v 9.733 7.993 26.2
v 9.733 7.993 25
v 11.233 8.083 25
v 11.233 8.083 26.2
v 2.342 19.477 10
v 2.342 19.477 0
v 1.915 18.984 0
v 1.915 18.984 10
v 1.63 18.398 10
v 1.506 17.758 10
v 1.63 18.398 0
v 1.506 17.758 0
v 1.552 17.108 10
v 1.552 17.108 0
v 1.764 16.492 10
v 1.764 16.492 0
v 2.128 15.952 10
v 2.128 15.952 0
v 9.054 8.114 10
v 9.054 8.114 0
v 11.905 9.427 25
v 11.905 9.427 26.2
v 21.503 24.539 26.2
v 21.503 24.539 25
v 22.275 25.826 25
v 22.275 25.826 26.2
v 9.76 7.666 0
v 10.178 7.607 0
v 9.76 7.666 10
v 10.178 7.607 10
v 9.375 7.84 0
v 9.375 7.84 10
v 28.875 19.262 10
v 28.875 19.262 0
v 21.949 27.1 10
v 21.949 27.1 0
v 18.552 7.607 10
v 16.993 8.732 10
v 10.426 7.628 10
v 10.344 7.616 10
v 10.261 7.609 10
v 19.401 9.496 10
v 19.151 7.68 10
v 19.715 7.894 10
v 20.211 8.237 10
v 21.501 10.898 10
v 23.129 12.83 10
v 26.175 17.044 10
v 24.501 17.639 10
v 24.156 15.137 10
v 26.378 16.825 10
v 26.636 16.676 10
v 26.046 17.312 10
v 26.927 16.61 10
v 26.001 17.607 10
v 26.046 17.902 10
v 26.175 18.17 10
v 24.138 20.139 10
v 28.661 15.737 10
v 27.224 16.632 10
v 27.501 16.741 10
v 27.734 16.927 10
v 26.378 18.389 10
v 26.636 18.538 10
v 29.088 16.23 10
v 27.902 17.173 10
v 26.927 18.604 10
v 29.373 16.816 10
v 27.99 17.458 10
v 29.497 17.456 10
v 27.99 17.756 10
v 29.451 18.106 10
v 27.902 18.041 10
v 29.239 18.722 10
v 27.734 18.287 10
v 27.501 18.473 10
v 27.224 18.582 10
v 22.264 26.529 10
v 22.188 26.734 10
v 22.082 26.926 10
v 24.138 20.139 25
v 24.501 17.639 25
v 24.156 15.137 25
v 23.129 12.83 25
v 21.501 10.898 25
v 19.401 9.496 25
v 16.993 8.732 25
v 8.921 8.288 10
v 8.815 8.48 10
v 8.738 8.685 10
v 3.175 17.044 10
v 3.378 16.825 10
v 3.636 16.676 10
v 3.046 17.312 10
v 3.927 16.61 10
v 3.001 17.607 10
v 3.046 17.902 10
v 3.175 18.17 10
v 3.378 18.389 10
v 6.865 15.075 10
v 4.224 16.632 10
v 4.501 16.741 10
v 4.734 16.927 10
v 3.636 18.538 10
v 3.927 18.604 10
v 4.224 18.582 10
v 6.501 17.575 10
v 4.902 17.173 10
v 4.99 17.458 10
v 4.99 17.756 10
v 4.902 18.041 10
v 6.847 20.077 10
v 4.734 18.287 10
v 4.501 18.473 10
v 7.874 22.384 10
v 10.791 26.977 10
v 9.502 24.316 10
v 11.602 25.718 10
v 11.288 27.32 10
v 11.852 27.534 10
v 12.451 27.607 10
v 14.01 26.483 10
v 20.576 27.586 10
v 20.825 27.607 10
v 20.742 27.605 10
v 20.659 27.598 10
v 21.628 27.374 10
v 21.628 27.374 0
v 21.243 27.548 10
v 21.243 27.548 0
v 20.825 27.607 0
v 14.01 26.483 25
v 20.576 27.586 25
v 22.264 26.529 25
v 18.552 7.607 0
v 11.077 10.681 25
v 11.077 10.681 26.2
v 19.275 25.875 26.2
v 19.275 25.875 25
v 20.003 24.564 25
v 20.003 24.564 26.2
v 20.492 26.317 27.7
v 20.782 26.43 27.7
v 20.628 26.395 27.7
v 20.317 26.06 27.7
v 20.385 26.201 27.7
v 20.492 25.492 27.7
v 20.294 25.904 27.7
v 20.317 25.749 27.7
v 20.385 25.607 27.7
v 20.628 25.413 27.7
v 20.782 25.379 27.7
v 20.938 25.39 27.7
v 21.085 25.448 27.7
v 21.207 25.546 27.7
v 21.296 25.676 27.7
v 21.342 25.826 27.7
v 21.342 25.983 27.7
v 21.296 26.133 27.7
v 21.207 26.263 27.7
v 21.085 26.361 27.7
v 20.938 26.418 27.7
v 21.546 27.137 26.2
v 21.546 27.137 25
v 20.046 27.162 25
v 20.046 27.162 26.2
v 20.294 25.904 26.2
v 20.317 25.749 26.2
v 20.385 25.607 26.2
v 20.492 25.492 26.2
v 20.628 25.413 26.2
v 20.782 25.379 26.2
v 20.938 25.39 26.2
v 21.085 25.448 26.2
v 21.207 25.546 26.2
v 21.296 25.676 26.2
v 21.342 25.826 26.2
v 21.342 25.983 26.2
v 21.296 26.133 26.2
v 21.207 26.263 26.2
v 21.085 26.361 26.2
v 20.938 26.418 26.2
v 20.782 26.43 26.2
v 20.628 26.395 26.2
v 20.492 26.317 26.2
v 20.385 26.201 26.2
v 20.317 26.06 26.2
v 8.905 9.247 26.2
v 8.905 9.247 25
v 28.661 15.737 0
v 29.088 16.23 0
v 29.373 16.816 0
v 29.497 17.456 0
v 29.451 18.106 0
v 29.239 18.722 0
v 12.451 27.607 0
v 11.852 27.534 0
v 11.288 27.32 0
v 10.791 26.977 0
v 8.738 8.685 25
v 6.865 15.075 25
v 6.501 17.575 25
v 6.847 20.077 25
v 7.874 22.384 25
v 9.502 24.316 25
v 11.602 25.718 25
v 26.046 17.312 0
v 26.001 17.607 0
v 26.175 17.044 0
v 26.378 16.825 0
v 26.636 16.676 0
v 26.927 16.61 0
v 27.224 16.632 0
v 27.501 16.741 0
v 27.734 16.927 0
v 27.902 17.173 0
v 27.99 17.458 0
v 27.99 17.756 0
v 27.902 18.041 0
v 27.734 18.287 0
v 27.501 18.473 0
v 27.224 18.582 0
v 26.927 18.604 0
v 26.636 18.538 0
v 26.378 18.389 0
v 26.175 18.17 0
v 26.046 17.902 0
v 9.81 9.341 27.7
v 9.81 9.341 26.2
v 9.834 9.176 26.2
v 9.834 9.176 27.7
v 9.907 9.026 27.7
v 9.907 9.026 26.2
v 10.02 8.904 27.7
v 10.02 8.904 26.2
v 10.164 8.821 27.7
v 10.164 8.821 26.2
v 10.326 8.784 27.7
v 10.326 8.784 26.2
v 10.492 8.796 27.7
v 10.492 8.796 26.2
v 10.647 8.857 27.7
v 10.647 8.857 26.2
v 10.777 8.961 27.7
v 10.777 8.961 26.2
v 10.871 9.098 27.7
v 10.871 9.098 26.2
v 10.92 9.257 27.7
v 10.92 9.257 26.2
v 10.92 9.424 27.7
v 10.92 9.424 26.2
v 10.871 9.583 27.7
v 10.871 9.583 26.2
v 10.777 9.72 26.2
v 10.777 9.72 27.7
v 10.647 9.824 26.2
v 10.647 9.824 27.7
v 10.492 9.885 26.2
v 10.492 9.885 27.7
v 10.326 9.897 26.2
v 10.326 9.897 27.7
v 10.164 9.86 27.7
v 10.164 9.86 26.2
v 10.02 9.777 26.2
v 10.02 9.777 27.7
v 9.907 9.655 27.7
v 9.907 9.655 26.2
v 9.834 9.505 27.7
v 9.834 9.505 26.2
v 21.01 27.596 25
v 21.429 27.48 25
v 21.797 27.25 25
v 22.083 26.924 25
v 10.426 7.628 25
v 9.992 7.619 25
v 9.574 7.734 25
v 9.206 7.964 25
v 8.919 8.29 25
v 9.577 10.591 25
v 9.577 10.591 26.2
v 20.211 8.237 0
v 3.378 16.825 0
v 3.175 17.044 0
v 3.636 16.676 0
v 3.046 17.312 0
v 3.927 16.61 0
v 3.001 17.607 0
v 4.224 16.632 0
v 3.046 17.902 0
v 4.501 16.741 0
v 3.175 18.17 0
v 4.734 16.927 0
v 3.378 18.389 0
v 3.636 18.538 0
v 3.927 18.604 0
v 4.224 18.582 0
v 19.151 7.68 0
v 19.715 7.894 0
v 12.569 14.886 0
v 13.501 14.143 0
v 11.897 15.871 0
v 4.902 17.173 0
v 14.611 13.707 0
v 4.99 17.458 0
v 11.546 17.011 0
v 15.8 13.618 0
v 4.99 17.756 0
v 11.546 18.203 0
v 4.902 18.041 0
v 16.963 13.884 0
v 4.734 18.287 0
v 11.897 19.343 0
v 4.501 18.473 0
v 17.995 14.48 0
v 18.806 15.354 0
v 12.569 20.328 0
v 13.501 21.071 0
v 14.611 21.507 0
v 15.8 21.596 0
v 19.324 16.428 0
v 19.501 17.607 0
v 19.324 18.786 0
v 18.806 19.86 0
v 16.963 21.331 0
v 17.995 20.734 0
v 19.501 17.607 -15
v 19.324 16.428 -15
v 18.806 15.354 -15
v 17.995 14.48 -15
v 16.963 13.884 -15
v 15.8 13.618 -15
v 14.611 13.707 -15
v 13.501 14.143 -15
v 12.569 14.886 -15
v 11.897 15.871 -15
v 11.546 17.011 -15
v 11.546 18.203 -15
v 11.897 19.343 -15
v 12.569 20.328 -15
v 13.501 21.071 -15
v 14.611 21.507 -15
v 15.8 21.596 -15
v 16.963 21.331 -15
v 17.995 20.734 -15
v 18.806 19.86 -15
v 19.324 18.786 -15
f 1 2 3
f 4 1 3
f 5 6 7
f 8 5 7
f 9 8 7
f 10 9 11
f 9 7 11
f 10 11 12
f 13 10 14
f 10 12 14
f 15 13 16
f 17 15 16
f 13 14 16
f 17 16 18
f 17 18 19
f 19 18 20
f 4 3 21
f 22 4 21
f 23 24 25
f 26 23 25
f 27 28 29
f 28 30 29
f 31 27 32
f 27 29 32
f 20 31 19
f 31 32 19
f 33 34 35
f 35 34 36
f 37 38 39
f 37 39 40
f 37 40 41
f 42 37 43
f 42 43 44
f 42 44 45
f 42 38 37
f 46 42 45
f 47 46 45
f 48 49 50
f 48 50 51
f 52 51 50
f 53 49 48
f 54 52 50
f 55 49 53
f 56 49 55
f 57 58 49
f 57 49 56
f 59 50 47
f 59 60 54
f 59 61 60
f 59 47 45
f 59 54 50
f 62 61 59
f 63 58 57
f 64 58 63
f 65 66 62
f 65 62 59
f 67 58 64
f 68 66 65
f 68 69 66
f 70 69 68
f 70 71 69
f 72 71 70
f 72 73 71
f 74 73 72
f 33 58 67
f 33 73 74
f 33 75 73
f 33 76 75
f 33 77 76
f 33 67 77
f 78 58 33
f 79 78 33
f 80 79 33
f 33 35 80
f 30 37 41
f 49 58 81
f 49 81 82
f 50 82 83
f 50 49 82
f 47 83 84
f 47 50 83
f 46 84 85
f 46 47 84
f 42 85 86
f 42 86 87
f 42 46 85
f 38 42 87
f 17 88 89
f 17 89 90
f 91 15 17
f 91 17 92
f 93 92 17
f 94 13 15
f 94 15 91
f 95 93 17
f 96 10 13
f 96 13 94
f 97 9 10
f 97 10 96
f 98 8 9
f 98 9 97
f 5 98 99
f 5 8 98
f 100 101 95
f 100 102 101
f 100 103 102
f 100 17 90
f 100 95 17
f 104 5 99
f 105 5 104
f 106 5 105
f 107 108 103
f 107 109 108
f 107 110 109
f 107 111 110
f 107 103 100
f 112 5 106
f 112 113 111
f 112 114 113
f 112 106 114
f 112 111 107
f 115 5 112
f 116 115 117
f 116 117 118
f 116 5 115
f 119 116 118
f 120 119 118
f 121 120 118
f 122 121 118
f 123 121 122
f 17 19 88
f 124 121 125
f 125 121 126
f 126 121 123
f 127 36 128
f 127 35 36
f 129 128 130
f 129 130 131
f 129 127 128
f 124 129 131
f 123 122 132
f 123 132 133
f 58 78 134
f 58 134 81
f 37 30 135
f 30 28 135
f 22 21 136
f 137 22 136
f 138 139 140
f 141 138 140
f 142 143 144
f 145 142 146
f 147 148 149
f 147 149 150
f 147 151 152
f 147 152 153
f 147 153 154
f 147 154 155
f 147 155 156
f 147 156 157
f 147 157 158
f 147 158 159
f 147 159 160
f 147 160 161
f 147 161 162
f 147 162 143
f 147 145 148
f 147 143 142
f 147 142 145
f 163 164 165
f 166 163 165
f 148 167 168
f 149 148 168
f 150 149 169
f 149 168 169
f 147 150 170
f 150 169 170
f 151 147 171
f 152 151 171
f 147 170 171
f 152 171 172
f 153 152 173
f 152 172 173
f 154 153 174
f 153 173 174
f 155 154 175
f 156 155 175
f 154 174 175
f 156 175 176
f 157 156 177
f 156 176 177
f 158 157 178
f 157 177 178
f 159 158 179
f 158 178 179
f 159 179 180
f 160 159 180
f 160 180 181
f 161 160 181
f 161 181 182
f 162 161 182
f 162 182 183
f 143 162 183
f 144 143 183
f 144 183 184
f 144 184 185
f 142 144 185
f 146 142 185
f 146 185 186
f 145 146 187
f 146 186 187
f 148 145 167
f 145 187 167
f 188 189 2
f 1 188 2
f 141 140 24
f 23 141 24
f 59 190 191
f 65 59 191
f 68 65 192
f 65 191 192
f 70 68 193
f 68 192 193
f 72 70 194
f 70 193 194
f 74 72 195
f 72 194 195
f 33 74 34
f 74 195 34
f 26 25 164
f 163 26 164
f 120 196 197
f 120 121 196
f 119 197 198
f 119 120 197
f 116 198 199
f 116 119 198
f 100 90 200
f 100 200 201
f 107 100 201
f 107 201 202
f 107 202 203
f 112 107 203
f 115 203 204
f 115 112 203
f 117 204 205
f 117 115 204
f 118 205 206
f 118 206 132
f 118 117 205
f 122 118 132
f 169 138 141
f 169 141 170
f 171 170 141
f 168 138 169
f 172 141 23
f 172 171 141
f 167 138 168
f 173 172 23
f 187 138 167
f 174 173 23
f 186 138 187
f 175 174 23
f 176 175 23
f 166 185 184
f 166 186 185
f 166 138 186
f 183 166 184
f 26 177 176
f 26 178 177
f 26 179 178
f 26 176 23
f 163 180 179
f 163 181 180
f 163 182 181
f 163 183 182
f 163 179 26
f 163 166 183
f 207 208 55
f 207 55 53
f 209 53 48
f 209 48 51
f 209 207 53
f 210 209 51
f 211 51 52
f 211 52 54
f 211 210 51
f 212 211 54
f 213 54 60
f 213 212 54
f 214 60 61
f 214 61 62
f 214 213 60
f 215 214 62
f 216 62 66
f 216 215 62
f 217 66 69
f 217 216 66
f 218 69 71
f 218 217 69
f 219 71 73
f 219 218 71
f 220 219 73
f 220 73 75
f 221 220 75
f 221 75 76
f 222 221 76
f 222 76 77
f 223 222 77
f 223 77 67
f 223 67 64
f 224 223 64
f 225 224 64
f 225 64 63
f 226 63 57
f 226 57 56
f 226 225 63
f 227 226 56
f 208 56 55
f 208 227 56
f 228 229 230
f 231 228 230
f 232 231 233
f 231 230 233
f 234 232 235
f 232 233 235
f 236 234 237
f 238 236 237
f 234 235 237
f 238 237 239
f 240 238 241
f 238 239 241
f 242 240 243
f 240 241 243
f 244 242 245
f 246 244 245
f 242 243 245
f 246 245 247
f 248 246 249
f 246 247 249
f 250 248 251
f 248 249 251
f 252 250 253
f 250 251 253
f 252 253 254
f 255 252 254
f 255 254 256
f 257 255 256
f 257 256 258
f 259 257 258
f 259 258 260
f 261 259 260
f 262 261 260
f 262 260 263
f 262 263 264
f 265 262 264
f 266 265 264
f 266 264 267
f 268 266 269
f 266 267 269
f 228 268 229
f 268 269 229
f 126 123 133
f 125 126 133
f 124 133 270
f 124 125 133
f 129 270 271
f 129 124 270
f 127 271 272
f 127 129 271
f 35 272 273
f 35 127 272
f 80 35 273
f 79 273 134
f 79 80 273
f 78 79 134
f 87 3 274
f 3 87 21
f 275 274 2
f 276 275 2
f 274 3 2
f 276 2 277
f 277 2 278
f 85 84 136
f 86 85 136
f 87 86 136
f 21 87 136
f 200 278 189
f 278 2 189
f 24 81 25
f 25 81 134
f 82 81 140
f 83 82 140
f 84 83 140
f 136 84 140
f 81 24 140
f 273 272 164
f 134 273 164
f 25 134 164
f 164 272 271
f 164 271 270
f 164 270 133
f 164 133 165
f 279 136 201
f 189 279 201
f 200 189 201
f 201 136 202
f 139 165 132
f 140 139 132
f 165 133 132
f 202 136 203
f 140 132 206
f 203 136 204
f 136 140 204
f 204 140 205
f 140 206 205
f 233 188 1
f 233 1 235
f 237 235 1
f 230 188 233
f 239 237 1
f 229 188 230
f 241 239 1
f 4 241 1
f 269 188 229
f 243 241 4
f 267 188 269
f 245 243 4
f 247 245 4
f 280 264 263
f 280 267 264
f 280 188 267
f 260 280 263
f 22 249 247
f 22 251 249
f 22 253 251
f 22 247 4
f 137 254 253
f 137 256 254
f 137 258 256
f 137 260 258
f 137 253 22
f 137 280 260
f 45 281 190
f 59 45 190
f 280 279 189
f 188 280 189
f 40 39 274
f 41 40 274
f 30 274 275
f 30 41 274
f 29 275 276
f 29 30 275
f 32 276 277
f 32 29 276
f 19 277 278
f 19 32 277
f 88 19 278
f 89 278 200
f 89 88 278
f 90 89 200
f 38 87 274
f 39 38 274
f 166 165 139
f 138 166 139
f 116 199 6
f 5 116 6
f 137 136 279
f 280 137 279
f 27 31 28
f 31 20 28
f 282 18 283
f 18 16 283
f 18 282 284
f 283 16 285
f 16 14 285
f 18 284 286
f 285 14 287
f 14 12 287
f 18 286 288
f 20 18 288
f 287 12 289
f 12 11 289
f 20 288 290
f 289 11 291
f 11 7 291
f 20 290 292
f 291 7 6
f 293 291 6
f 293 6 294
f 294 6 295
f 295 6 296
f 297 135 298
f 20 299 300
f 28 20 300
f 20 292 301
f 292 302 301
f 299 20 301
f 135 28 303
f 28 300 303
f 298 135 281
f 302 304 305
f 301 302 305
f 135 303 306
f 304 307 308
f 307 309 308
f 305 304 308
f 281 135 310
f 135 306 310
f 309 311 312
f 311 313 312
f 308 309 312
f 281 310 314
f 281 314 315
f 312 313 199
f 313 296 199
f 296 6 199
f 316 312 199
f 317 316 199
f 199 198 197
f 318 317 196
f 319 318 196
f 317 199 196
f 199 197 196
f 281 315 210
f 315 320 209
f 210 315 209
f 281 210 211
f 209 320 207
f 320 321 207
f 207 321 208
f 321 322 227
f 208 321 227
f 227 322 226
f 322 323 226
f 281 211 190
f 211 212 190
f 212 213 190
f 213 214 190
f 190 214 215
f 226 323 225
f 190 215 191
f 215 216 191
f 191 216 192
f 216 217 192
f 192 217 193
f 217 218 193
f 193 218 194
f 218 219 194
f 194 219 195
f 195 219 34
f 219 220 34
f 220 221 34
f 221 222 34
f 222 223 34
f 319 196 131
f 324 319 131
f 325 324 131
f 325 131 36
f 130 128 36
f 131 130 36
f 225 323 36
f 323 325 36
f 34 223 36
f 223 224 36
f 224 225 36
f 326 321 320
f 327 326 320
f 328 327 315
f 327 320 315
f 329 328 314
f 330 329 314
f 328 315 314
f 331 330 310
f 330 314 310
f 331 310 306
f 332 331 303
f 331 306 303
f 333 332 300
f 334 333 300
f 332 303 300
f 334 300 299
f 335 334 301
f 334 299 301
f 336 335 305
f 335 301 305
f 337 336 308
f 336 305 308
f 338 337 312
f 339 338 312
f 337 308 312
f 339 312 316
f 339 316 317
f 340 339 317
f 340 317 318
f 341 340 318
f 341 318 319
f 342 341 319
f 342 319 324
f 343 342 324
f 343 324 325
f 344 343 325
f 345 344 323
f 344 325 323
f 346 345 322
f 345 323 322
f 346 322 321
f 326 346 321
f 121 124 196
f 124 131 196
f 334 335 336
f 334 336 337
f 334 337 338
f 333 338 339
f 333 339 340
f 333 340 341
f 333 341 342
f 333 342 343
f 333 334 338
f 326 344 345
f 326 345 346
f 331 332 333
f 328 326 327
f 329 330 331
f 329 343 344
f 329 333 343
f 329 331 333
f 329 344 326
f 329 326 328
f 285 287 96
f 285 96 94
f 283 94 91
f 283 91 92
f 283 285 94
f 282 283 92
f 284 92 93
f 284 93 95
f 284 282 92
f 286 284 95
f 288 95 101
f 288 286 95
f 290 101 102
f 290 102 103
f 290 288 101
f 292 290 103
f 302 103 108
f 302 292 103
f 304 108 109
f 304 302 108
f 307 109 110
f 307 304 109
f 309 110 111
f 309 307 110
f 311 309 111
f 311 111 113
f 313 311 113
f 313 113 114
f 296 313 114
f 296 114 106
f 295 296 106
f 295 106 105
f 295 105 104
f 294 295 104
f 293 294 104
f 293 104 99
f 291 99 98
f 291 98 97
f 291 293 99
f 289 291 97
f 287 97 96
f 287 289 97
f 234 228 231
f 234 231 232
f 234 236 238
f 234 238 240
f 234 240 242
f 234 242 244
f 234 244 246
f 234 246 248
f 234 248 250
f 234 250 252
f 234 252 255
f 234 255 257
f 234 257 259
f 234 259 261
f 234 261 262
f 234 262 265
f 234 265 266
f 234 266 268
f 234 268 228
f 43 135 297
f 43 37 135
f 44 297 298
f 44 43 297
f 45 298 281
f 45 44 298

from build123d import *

# Parameters (mm, degrees)
SKETCH_1_R      = 1
EXTRUDE_1_DEPTH = 10
EXTRUDE_2_DEPTH = 15
SKETCH_3_R      = 4
EXTRUDE_3_DEPTH = 15
FILLET_1_R      = 1.5
FILLET_2_R      = 2.5
EXTRUDE_4_DEPTH = 1.2
SKETCH_9_R      = 0.527306968
EXTRUDE_5_DEPTH = 1.5
SKETCH_10_R     = 0.558325025
EXTRUDE_6_DEPTH = 1.5


with BuildPart() as part:
    # Эскиз1 → Вытянуть1 (new body)
    with BuildSketch(Plane.XY):
        with BuildLine():
            Line((9.501316689, 7.607009807), (19.501316689, 7.607009807))
            Line((19.501316689, 7.607009807), (28.660908483, 15.737315961))
            ThreePointArc((28.660908483, 15.737315961), (29.496729836, 17.455638669), (28.874738709, 19.262391918))
            Line((28.874738709, 19.262391918), (21.501316689, 27.607009807))
            Line((21.501316689, 27.607009807), (11.501316689, 27.607009807))
            Line((11.501316689, 27.607009807), (2.341724894, 19.476703653))
            ThreePointArc((2.341724894, 19.476703653), (1.505903541, 17.758380944), (2.127894668, 15.951627696))
            Line((2.127894668, 15.951627696), (9.501316689, 7.607009807))
        make_face()
        with Locations(Location((27.001316689, 17.607009807, 0), (0, 0, 180))):
            Circle(SKETCH_1_R, mode=Mode.SUBTRACT)
        with Locations(Location((4.001316689, 17.607009807, 0), (0, 0, 180))):
            Circle(SKETCH_1_R, mode=Mode.SUBTRACT)
    extrude(amount=EXTRUDE_1_DEPTH)

    # Эскиз2 → Вытянуть2 (add)
    with BuildSketch(Plane.XY.offset(10)):
        with BuildLine():
            Line((22.264471235, 26.529000138), (24.137824651, 20.138951792))
            ThreePointArc((24.137824651, 20.138951792), (23.128766256, 12.82977074), (16.993089347, 8.73150338))
            Line((16.993089347, 8.73150338), (10.426208912, 7.627758736))
            ThreePointArc((10.426208912, 7.627758736), (9.381373625, 7.835768212), (8.738162142, 8.685019476))
            Line((8.738162142, 8.685019476), (6.864808726, 15.075067822))
            ThreePointArc((6.864808726, 15.075067822), (7.873867121, 22.384248873), (14.00954403, 26.482516234))
            Line((14.00954403, 26.482516234), (20.576424465, 27.586260878))
            ThreePointArc((20.576424465, 27.586260878), (21.621259753, 27.378251401), (22.264471235, 26.529000138))
        make_face()
    extrude(amount=EXTRUDE_2_DEPTH)

    # Эскиз3 → Вытянуть3 (add)
    with BuildSketch(Plane(origin=(0, 0, 0), x_dir=(-1, 0, 0), z_dir=(0, 0, -1))):
        with Locations(Location((-15.501316689, 17.607009807, 0), (0, 0, 180))):
            Circle(SKETCH_3_R)
    extrude(amount=EXTRUDE_3_DEPTH)

    # Скругление1
    fillet_1_edges = [part.edges().sort_by_distance(p)[0] for p in [
        (9.501316689, 7.607009807, 5),
        (21.501316689, 27.607009807, 5),
    ]]
    fillet(fillet_1_edges, radius=FILLET_1_R - 0.0001)  # a hair under: the kernel refuses the full size

    # Скругление2
    fillet_2_edges = [part.edges().sort_by_distance(p)[0] for p in [
        (19.501316689, 7.607009807, 5),
        (11.501316689, 27.607009807, 5),
    ]]
    fillet(fillet_2_edges, radius=FILLET_2_R)

    # Эскиз8 → Вытянуть4 (add)
    with BuildSketch(Plane.XY.offset(25)):
        Polygon((20.046142028, 27.162033609), (19.274705601, 25.87537183), (20.003269175, 24.563957398), (21.503269175, 24.539204745), (22.274705601, 25.825866524), (21.546142028, 27.137280956), align=None)
        Polygon((11.07675483, 10.680633722), (9.57675483, 10.59059908), (8.904727117, 9.246543654), (9.732699404, 7.992522869), (11.232699404, 8.082557511), (11.904727117, 9.426612937), align=None)
    extrude(amount=EXTRUDE_4_DEPTH)

    # Эскиз9 → Вытянуть5 (add)
    with BuildSketch(Plane.XY.offset(26.2)):
        with Locations(Location((20.820913454, 25.904340038, 0), (0, 0, 180))):
            Circle(SKETCH_9_R)
    extrude(amount=EXTRUDE_5_DEPTH)

    # Эскиз10 → Вытянуть6 (add)
    with BuildSketch(Plane.XY.offset(26.2)):
        with Locations(Location((10.367828265, 9.340697632, 0), (0, 0, 180))):
            Circle(SKETCH_10_R)
    extrude(amount=EXTRUDE_6_DEPTH)


solid = part.part
